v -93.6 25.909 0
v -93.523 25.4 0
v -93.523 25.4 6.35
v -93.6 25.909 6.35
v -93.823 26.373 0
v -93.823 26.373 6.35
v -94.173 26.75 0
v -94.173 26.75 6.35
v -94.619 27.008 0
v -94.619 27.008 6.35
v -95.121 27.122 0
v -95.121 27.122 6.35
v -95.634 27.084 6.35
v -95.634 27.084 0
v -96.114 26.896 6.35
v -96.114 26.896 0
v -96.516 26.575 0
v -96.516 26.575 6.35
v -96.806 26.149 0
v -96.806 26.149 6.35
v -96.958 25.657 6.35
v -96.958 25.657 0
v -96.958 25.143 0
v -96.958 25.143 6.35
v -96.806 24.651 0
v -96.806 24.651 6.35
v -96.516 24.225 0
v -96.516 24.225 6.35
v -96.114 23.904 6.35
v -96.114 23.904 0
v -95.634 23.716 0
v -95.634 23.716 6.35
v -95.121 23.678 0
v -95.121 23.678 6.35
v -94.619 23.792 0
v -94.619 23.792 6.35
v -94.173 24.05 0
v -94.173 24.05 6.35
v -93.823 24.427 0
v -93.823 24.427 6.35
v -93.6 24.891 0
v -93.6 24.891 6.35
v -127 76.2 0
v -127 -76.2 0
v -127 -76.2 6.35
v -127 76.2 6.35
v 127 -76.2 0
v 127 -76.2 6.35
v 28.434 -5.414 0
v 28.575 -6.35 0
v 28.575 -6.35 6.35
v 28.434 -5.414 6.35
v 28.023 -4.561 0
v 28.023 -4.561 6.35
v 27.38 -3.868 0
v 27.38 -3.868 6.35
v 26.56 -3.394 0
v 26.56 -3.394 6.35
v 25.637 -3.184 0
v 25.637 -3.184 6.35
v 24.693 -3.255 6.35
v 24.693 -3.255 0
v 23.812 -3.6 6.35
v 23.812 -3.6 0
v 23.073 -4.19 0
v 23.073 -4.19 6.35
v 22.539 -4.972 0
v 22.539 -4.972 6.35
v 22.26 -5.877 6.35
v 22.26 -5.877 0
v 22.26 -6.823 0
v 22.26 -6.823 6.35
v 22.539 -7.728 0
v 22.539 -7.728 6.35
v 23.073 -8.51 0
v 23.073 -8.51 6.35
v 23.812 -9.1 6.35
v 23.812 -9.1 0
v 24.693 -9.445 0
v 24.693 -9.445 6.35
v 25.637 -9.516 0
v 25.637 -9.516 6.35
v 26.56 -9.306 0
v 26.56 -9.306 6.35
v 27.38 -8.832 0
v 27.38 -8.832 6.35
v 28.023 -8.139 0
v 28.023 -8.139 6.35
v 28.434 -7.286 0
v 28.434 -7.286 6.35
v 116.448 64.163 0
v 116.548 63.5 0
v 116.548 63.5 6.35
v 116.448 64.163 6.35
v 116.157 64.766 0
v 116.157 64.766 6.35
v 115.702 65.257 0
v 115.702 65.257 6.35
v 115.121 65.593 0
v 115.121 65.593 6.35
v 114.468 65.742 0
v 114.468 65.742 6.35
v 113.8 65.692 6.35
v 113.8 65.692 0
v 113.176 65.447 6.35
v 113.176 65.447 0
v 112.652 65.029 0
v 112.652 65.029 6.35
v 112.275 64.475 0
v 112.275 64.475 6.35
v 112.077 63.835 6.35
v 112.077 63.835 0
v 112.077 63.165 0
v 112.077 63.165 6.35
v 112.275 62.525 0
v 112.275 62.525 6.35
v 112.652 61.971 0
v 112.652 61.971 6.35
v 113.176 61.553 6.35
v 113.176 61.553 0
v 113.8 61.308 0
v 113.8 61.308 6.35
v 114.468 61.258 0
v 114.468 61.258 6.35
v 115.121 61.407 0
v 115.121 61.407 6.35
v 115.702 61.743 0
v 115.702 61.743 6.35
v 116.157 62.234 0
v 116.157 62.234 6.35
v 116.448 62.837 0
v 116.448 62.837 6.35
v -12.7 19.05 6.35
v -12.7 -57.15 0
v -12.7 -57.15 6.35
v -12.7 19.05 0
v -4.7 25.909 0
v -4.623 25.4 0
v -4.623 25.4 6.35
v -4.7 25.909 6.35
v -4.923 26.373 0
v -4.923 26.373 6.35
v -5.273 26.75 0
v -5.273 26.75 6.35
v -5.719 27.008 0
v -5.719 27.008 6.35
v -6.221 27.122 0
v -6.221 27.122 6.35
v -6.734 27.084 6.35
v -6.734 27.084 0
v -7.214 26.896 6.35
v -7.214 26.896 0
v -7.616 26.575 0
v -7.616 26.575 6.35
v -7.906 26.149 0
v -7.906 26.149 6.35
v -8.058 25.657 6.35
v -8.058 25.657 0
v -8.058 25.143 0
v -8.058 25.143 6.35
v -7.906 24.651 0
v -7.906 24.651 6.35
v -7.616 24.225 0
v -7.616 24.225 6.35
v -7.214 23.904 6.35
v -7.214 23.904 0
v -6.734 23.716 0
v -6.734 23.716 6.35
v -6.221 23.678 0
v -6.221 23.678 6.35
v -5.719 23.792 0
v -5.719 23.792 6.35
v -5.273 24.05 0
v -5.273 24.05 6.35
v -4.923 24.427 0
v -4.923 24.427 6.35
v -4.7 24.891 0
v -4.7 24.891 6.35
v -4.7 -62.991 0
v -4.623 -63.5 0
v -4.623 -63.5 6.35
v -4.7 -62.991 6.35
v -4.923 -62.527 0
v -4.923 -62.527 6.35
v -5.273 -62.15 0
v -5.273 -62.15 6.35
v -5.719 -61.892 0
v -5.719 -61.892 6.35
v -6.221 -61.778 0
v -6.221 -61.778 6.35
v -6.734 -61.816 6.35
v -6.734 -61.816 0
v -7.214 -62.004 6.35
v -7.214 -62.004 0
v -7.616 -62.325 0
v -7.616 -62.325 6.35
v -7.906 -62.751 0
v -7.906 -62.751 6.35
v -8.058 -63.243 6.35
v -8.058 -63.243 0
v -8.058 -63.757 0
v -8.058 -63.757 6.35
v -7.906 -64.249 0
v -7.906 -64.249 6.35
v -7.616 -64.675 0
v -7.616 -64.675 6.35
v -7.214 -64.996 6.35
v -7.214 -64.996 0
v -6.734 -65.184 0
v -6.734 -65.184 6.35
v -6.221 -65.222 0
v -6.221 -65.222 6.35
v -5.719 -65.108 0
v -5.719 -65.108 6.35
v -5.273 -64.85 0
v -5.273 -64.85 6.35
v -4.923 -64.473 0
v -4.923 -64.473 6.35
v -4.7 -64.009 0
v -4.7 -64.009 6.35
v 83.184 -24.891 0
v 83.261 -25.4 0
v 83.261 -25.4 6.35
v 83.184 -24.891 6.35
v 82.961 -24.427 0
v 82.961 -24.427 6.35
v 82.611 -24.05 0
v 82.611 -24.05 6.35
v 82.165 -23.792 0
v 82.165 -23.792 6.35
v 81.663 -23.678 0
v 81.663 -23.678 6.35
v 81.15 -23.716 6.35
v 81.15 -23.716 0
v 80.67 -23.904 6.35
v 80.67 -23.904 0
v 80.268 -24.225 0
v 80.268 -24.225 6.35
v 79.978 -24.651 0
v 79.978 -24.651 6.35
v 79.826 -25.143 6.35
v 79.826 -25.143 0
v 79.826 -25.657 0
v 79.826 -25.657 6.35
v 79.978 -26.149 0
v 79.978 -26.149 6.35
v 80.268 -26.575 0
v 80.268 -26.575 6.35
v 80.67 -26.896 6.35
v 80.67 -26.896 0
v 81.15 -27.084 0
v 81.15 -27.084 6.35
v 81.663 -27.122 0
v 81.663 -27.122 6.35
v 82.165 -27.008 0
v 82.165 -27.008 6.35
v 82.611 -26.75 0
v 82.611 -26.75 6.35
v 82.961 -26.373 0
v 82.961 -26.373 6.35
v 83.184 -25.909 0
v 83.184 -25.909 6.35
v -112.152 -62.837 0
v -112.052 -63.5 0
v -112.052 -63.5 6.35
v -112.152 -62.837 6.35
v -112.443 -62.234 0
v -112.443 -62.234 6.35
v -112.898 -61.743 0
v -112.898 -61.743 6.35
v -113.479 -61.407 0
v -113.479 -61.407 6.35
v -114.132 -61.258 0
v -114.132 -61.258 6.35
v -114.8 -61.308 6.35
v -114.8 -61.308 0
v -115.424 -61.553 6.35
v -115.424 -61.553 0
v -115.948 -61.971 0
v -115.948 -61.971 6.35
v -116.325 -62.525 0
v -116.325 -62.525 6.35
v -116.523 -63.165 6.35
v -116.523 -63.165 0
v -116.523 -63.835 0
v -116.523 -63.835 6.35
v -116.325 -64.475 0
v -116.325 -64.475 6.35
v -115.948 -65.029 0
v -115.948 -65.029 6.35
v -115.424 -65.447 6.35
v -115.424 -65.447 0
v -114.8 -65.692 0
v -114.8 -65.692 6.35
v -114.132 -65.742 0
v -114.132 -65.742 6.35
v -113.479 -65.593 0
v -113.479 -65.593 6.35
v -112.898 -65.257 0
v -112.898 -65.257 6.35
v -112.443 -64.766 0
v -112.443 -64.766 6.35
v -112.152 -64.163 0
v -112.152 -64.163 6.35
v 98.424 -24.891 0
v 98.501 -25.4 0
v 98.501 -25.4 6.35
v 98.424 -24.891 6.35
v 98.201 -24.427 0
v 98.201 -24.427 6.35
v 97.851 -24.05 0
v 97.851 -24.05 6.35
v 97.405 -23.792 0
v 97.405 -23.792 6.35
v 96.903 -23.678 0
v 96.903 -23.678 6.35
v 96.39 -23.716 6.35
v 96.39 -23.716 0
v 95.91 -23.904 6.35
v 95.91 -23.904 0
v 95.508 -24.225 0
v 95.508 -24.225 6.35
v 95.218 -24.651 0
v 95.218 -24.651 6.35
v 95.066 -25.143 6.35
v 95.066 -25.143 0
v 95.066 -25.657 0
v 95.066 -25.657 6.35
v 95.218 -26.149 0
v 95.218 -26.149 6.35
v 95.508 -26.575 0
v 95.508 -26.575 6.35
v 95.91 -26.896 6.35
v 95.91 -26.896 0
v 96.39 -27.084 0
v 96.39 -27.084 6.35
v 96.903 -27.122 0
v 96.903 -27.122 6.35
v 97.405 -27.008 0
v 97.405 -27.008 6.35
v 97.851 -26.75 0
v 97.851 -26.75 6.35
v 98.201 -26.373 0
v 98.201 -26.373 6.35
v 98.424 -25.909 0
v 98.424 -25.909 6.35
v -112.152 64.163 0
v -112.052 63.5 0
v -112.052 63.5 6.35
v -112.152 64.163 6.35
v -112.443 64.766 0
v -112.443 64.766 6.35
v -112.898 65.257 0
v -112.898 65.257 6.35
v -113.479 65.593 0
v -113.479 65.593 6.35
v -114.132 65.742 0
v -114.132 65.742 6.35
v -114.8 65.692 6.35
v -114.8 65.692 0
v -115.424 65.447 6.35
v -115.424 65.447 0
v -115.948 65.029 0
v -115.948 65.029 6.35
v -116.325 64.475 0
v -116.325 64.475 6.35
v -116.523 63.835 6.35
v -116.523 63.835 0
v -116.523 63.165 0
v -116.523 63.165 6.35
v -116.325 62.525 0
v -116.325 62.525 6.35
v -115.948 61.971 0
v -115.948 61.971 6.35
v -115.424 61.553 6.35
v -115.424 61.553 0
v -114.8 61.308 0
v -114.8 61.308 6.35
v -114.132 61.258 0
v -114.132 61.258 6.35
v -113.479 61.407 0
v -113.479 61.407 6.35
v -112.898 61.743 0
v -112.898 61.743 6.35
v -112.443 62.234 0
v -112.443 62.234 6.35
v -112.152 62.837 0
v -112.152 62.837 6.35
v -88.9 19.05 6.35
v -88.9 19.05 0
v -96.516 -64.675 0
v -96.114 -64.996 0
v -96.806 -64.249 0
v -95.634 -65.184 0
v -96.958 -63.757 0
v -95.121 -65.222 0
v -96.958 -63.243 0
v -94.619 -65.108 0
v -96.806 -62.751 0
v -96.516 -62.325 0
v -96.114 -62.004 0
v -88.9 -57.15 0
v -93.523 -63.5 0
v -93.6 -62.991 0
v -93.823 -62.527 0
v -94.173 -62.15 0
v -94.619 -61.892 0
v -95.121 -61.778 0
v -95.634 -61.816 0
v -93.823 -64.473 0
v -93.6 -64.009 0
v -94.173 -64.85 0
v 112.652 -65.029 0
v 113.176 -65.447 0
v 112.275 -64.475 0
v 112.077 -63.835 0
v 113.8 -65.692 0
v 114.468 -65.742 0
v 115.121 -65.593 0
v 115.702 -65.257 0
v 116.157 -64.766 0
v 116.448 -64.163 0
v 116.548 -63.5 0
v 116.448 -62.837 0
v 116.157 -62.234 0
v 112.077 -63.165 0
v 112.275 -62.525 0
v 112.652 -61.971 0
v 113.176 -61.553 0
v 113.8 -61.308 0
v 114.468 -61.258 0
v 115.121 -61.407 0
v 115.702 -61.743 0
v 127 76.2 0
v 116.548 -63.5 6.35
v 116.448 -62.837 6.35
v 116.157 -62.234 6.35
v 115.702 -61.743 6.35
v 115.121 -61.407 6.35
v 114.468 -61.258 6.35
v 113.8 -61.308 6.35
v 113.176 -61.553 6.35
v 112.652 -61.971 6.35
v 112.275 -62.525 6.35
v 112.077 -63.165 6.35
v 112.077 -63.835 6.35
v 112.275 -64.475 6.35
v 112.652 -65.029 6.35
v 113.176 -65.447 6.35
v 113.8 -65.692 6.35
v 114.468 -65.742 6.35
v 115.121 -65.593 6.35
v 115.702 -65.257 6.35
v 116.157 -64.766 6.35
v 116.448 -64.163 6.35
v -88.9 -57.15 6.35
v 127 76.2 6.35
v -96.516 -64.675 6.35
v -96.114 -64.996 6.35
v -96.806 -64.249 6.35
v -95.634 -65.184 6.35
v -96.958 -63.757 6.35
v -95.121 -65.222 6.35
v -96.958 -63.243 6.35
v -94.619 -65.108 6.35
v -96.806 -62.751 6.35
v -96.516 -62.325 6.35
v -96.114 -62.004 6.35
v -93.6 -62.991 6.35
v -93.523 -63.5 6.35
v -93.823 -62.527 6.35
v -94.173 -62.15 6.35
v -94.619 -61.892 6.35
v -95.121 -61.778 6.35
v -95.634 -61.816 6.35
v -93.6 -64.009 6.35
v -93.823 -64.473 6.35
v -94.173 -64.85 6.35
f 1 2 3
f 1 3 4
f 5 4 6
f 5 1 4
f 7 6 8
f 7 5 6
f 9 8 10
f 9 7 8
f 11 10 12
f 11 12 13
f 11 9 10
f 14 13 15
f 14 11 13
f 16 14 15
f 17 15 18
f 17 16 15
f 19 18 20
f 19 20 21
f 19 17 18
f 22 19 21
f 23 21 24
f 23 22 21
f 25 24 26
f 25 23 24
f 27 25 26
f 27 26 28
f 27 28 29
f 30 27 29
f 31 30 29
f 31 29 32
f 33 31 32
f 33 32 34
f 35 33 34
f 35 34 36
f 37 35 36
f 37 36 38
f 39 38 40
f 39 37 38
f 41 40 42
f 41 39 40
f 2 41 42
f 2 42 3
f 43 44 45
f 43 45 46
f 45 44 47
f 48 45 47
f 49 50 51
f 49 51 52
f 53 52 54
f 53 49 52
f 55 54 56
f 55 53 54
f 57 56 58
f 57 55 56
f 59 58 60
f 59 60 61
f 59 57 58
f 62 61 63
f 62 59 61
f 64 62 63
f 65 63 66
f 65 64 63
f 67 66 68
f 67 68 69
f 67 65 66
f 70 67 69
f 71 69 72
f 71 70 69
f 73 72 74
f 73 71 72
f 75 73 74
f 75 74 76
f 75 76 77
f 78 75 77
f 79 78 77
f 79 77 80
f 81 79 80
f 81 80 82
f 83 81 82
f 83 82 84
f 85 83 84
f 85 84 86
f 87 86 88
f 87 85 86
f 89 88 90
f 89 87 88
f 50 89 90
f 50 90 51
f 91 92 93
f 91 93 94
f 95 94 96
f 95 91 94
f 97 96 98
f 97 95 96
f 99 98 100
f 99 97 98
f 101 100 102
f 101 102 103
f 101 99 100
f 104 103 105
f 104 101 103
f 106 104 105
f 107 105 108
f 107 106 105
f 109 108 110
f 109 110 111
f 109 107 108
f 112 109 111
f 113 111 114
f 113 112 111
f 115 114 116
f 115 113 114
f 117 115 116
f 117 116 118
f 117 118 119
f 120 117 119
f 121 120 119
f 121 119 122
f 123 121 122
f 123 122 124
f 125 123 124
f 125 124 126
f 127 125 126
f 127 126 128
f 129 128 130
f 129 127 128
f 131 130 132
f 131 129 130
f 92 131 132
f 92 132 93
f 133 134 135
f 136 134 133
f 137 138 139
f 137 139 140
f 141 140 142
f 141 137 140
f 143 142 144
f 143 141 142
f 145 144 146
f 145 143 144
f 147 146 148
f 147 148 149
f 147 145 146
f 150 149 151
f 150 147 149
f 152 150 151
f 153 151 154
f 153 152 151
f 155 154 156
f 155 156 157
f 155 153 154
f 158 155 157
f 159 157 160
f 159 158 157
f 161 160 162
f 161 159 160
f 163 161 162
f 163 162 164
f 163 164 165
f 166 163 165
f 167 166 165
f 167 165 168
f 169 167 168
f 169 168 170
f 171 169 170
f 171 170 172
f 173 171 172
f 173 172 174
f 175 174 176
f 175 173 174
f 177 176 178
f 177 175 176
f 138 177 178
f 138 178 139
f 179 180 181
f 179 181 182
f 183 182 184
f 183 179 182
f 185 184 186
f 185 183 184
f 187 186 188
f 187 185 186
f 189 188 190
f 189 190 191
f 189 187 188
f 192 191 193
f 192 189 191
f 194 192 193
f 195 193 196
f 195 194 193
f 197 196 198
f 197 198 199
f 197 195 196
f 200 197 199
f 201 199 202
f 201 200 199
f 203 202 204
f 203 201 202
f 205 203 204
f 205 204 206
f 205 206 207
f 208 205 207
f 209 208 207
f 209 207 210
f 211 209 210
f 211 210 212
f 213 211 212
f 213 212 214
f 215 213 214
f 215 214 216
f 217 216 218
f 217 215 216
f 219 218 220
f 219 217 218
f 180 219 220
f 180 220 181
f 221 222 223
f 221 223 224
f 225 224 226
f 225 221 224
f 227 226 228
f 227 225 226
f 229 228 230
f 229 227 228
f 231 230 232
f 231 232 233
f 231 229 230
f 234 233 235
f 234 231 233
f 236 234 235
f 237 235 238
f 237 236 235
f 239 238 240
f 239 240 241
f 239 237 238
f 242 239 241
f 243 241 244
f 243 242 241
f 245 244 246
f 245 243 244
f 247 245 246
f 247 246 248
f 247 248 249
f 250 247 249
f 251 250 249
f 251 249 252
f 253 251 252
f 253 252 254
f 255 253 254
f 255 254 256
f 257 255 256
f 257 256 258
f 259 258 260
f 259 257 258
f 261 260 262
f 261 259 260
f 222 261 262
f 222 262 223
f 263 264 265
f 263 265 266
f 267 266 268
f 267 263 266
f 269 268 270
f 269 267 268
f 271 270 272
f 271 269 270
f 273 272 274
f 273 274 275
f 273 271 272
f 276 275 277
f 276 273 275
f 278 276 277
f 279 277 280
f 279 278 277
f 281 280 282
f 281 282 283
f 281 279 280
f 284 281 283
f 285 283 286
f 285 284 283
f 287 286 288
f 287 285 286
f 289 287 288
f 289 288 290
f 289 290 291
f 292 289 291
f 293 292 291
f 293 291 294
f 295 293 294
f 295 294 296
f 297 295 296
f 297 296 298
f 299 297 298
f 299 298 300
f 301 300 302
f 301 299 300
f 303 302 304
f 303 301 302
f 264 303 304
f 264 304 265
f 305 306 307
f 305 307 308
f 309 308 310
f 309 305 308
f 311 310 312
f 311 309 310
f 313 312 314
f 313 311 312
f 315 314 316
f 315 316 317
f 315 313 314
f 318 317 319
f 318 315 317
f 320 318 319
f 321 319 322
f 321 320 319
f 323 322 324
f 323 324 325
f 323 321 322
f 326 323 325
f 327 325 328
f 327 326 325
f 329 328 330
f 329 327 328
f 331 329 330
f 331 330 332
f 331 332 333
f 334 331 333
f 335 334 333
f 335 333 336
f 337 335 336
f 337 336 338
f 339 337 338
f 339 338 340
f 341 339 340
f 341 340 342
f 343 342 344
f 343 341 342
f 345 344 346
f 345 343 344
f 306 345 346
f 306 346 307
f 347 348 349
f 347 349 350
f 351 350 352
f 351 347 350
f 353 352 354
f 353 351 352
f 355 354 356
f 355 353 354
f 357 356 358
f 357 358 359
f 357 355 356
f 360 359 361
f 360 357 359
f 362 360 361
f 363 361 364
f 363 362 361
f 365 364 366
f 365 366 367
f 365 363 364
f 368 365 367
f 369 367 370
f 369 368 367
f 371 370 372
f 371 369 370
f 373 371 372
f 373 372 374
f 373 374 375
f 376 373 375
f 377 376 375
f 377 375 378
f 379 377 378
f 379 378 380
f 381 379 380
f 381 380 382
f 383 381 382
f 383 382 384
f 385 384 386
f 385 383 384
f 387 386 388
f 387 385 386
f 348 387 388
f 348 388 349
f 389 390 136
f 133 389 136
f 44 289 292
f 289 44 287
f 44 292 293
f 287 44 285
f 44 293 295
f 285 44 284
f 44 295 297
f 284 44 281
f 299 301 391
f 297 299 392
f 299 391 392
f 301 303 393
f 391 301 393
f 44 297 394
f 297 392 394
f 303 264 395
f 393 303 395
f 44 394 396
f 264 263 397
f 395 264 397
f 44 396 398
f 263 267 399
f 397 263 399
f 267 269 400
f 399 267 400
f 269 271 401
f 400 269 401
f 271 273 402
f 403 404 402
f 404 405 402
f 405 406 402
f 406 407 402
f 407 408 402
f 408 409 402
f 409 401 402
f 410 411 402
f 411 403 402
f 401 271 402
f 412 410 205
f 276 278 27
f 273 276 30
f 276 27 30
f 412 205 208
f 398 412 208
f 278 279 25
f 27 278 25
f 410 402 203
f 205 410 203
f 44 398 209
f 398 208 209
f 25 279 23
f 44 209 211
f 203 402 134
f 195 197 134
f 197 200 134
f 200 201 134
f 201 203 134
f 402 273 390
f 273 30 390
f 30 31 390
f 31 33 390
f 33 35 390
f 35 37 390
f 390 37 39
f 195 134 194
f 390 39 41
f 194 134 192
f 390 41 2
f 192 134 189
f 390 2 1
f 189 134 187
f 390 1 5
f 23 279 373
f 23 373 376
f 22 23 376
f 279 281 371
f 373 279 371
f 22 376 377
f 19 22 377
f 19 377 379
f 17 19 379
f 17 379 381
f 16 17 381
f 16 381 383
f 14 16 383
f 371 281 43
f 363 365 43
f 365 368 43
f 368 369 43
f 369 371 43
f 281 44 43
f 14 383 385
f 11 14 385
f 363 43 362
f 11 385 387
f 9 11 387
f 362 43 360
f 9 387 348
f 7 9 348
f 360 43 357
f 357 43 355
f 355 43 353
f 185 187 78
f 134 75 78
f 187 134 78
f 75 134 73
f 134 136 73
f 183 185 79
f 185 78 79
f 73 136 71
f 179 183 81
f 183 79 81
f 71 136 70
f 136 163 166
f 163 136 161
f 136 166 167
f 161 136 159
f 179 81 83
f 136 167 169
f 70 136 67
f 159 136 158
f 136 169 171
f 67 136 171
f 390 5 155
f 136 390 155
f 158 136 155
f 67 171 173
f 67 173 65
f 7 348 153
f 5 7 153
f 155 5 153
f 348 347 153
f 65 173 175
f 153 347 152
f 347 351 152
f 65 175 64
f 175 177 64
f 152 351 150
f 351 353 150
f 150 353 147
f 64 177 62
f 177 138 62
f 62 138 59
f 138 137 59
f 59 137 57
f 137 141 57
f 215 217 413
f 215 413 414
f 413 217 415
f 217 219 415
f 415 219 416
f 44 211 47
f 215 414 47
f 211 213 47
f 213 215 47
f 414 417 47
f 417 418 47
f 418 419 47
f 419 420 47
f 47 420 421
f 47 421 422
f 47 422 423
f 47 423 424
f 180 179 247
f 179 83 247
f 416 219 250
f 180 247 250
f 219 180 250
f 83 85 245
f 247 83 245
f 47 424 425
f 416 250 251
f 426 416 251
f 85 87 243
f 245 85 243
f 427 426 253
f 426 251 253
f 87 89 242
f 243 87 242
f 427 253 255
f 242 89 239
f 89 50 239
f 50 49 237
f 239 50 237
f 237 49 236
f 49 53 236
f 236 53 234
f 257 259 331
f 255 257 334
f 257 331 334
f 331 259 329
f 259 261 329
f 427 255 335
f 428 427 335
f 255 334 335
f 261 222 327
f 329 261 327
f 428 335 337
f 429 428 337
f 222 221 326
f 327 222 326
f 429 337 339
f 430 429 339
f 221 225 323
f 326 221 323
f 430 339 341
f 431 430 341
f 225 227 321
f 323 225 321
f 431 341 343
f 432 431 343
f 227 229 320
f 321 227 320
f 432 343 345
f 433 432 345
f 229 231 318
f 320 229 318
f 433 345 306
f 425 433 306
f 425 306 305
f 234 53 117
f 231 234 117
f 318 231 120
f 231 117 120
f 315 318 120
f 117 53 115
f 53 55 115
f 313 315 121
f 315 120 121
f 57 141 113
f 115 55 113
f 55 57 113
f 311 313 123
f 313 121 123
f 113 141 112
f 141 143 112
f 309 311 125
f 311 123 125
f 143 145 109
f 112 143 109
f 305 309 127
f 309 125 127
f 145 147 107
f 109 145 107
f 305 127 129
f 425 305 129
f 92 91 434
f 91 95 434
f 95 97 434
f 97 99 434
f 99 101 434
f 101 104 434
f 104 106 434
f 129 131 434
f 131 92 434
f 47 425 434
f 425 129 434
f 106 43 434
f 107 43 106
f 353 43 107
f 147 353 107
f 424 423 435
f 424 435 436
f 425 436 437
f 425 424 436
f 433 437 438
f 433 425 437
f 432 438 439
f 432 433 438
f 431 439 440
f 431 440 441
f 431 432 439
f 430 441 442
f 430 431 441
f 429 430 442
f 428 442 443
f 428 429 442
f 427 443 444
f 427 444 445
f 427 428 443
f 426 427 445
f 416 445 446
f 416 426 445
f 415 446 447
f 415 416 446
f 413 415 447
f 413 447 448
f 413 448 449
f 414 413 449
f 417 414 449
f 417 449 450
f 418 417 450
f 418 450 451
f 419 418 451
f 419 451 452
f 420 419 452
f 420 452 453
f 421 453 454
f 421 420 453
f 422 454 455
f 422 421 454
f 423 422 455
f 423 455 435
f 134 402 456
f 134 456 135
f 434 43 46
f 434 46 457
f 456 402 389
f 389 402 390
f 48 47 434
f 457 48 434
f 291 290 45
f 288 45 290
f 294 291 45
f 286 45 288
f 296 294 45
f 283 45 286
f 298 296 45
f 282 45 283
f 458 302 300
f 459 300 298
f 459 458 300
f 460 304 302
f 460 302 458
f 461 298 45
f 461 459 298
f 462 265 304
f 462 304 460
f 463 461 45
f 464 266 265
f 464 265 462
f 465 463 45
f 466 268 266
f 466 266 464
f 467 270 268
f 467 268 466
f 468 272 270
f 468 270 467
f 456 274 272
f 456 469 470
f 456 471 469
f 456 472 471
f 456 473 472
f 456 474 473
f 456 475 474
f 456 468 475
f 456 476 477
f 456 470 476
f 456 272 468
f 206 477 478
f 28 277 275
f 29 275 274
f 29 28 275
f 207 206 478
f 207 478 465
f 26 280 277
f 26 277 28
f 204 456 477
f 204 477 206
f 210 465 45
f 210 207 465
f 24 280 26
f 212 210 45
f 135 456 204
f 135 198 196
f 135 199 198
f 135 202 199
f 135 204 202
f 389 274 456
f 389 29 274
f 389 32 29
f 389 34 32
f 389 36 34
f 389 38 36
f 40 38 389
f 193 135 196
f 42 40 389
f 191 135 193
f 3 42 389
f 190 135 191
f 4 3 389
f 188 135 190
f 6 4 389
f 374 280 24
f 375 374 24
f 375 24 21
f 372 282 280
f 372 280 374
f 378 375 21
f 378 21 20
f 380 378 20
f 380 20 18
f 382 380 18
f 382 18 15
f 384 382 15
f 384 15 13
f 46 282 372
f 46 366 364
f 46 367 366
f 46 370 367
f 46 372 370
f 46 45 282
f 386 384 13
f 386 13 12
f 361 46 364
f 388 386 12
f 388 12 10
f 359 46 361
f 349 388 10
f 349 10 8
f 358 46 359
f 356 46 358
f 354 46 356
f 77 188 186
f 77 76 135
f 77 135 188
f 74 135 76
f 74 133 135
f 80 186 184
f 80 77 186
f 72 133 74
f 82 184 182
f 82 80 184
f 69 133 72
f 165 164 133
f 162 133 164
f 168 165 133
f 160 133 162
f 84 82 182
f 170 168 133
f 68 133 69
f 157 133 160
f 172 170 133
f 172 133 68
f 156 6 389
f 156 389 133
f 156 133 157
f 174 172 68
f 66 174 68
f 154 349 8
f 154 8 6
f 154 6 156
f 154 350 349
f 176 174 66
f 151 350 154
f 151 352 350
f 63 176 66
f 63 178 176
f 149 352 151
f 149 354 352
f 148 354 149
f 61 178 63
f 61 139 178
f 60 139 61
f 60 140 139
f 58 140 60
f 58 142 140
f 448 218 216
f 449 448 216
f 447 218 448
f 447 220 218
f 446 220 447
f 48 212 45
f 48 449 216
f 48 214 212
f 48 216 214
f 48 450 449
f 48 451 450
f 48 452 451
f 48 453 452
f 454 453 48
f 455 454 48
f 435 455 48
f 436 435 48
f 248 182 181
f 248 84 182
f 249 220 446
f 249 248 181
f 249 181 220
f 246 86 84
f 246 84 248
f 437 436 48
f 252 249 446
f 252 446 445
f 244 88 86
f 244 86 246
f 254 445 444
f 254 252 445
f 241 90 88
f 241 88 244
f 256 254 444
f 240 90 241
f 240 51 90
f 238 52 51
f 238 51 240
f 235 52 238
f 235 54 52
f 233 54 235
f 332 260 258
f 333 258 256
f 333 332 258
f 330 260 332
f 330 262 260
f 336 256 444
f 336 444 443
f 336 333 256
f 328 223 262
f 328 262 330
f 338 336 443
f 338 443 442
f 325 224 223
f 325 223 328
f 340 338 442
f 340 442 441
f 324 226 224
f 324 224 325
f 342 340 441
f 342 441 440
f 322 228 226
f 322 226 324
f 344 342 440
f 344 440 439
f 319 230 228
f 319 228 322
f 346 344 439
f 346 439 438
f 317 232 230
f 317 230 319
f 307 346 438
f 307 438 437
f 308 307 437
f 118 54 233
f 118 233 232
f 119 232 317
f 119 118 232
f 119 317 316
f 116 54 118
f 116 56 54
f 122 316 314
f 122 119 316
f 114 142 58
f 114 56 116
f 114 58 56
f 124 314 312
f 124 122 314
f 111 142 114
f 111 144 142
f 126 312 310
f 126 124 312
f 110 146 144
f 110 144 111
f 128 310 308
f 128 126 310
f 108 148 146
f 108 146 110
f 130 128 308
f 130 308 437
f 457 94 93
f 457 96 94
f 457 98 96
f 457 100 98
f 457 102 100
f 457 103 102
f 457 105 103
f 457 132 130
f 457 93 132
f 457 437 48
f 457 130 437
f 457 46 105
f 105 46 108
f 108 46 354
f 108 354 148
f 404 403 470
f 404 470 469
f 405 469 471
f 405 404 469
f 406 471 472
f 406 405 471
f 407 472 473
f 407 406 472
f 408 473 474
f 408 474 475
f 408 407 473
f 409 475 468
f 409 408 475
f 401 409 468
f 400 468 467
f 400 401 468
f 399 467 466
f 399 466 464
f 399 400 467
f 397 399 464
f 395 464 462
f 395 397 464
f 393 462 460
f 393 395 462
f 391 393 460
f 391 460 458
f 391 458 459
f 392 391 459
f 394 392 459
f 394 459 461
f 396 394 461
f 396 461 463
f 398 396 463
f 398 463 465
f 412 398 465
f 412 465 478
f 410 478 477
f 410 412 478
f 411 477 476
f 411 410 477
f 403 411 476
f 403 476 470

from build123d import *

# Parameters (mm, degrees)
F0_W     = 254
F0_H     = 152.4
F0_R     = 2.2479
F0_R_2   = 1.7272
F0_W_2   = 76.2
F0_H_2   = 76.2
F0_R_3   = 3.175
F1_DEPTH = 6.35


with BuildPart() as f1:
    # F0 (on Top) → F1 (new body)
    with BuildSketch(Plane.XY):
        Rectangle(F0_W, F0_H)
        with Locations((-114.3, -63.5)):
            Circle(F0_R, mode=Mode.SUBTRACT)
        with Locations((-95.25, -63.5)):
            Circle(F0_R_2, mode=Mode.SUBTRACT)
        with Locations((-6.35, -63.5)):
            Circle(F0_R_2, mode=Mode.SUBTRACT)
        with Locations((-50.8, -19.05)):
            Rectangle(F0_W_2, F0_H_2, mode=Mode.SUBTRACT)
        with Locations((114.3, -63.5)):
            Circle(F0_R, mode=Mode.SUBTRACT)
        with Locations((25.4, -6.35)):
            Circle(F0_R_3, mode=Mode.SUBTRACT)
        with Locations((81.534, -25.4)):
            Circle(F0_R_2, mode=Mode.SUBTRACT)
        with Locations((96.774, -25.4)):
            Circle(F0_R_2, mode=Mode.SUBTRACT)
        with Locations((-95.25, 25.4)):
            Circle(F0_R_2, mode=Mode.SUBTRACT)
        with Locations((-6.35, 25.4)):
            Circle(F0_R_2, mode=Mode.SUBTRACT)
        with Locations((-114.3, 63.5)):
            Circle(F0_R, mode=Mode.SUBTRACT)
        with Locations((114.3, 63.5)):
            Circle(F0_R, mode=Mode.SUBTRACT)
    extrude(amount=F1_DEPTH)


solid = f1.part
